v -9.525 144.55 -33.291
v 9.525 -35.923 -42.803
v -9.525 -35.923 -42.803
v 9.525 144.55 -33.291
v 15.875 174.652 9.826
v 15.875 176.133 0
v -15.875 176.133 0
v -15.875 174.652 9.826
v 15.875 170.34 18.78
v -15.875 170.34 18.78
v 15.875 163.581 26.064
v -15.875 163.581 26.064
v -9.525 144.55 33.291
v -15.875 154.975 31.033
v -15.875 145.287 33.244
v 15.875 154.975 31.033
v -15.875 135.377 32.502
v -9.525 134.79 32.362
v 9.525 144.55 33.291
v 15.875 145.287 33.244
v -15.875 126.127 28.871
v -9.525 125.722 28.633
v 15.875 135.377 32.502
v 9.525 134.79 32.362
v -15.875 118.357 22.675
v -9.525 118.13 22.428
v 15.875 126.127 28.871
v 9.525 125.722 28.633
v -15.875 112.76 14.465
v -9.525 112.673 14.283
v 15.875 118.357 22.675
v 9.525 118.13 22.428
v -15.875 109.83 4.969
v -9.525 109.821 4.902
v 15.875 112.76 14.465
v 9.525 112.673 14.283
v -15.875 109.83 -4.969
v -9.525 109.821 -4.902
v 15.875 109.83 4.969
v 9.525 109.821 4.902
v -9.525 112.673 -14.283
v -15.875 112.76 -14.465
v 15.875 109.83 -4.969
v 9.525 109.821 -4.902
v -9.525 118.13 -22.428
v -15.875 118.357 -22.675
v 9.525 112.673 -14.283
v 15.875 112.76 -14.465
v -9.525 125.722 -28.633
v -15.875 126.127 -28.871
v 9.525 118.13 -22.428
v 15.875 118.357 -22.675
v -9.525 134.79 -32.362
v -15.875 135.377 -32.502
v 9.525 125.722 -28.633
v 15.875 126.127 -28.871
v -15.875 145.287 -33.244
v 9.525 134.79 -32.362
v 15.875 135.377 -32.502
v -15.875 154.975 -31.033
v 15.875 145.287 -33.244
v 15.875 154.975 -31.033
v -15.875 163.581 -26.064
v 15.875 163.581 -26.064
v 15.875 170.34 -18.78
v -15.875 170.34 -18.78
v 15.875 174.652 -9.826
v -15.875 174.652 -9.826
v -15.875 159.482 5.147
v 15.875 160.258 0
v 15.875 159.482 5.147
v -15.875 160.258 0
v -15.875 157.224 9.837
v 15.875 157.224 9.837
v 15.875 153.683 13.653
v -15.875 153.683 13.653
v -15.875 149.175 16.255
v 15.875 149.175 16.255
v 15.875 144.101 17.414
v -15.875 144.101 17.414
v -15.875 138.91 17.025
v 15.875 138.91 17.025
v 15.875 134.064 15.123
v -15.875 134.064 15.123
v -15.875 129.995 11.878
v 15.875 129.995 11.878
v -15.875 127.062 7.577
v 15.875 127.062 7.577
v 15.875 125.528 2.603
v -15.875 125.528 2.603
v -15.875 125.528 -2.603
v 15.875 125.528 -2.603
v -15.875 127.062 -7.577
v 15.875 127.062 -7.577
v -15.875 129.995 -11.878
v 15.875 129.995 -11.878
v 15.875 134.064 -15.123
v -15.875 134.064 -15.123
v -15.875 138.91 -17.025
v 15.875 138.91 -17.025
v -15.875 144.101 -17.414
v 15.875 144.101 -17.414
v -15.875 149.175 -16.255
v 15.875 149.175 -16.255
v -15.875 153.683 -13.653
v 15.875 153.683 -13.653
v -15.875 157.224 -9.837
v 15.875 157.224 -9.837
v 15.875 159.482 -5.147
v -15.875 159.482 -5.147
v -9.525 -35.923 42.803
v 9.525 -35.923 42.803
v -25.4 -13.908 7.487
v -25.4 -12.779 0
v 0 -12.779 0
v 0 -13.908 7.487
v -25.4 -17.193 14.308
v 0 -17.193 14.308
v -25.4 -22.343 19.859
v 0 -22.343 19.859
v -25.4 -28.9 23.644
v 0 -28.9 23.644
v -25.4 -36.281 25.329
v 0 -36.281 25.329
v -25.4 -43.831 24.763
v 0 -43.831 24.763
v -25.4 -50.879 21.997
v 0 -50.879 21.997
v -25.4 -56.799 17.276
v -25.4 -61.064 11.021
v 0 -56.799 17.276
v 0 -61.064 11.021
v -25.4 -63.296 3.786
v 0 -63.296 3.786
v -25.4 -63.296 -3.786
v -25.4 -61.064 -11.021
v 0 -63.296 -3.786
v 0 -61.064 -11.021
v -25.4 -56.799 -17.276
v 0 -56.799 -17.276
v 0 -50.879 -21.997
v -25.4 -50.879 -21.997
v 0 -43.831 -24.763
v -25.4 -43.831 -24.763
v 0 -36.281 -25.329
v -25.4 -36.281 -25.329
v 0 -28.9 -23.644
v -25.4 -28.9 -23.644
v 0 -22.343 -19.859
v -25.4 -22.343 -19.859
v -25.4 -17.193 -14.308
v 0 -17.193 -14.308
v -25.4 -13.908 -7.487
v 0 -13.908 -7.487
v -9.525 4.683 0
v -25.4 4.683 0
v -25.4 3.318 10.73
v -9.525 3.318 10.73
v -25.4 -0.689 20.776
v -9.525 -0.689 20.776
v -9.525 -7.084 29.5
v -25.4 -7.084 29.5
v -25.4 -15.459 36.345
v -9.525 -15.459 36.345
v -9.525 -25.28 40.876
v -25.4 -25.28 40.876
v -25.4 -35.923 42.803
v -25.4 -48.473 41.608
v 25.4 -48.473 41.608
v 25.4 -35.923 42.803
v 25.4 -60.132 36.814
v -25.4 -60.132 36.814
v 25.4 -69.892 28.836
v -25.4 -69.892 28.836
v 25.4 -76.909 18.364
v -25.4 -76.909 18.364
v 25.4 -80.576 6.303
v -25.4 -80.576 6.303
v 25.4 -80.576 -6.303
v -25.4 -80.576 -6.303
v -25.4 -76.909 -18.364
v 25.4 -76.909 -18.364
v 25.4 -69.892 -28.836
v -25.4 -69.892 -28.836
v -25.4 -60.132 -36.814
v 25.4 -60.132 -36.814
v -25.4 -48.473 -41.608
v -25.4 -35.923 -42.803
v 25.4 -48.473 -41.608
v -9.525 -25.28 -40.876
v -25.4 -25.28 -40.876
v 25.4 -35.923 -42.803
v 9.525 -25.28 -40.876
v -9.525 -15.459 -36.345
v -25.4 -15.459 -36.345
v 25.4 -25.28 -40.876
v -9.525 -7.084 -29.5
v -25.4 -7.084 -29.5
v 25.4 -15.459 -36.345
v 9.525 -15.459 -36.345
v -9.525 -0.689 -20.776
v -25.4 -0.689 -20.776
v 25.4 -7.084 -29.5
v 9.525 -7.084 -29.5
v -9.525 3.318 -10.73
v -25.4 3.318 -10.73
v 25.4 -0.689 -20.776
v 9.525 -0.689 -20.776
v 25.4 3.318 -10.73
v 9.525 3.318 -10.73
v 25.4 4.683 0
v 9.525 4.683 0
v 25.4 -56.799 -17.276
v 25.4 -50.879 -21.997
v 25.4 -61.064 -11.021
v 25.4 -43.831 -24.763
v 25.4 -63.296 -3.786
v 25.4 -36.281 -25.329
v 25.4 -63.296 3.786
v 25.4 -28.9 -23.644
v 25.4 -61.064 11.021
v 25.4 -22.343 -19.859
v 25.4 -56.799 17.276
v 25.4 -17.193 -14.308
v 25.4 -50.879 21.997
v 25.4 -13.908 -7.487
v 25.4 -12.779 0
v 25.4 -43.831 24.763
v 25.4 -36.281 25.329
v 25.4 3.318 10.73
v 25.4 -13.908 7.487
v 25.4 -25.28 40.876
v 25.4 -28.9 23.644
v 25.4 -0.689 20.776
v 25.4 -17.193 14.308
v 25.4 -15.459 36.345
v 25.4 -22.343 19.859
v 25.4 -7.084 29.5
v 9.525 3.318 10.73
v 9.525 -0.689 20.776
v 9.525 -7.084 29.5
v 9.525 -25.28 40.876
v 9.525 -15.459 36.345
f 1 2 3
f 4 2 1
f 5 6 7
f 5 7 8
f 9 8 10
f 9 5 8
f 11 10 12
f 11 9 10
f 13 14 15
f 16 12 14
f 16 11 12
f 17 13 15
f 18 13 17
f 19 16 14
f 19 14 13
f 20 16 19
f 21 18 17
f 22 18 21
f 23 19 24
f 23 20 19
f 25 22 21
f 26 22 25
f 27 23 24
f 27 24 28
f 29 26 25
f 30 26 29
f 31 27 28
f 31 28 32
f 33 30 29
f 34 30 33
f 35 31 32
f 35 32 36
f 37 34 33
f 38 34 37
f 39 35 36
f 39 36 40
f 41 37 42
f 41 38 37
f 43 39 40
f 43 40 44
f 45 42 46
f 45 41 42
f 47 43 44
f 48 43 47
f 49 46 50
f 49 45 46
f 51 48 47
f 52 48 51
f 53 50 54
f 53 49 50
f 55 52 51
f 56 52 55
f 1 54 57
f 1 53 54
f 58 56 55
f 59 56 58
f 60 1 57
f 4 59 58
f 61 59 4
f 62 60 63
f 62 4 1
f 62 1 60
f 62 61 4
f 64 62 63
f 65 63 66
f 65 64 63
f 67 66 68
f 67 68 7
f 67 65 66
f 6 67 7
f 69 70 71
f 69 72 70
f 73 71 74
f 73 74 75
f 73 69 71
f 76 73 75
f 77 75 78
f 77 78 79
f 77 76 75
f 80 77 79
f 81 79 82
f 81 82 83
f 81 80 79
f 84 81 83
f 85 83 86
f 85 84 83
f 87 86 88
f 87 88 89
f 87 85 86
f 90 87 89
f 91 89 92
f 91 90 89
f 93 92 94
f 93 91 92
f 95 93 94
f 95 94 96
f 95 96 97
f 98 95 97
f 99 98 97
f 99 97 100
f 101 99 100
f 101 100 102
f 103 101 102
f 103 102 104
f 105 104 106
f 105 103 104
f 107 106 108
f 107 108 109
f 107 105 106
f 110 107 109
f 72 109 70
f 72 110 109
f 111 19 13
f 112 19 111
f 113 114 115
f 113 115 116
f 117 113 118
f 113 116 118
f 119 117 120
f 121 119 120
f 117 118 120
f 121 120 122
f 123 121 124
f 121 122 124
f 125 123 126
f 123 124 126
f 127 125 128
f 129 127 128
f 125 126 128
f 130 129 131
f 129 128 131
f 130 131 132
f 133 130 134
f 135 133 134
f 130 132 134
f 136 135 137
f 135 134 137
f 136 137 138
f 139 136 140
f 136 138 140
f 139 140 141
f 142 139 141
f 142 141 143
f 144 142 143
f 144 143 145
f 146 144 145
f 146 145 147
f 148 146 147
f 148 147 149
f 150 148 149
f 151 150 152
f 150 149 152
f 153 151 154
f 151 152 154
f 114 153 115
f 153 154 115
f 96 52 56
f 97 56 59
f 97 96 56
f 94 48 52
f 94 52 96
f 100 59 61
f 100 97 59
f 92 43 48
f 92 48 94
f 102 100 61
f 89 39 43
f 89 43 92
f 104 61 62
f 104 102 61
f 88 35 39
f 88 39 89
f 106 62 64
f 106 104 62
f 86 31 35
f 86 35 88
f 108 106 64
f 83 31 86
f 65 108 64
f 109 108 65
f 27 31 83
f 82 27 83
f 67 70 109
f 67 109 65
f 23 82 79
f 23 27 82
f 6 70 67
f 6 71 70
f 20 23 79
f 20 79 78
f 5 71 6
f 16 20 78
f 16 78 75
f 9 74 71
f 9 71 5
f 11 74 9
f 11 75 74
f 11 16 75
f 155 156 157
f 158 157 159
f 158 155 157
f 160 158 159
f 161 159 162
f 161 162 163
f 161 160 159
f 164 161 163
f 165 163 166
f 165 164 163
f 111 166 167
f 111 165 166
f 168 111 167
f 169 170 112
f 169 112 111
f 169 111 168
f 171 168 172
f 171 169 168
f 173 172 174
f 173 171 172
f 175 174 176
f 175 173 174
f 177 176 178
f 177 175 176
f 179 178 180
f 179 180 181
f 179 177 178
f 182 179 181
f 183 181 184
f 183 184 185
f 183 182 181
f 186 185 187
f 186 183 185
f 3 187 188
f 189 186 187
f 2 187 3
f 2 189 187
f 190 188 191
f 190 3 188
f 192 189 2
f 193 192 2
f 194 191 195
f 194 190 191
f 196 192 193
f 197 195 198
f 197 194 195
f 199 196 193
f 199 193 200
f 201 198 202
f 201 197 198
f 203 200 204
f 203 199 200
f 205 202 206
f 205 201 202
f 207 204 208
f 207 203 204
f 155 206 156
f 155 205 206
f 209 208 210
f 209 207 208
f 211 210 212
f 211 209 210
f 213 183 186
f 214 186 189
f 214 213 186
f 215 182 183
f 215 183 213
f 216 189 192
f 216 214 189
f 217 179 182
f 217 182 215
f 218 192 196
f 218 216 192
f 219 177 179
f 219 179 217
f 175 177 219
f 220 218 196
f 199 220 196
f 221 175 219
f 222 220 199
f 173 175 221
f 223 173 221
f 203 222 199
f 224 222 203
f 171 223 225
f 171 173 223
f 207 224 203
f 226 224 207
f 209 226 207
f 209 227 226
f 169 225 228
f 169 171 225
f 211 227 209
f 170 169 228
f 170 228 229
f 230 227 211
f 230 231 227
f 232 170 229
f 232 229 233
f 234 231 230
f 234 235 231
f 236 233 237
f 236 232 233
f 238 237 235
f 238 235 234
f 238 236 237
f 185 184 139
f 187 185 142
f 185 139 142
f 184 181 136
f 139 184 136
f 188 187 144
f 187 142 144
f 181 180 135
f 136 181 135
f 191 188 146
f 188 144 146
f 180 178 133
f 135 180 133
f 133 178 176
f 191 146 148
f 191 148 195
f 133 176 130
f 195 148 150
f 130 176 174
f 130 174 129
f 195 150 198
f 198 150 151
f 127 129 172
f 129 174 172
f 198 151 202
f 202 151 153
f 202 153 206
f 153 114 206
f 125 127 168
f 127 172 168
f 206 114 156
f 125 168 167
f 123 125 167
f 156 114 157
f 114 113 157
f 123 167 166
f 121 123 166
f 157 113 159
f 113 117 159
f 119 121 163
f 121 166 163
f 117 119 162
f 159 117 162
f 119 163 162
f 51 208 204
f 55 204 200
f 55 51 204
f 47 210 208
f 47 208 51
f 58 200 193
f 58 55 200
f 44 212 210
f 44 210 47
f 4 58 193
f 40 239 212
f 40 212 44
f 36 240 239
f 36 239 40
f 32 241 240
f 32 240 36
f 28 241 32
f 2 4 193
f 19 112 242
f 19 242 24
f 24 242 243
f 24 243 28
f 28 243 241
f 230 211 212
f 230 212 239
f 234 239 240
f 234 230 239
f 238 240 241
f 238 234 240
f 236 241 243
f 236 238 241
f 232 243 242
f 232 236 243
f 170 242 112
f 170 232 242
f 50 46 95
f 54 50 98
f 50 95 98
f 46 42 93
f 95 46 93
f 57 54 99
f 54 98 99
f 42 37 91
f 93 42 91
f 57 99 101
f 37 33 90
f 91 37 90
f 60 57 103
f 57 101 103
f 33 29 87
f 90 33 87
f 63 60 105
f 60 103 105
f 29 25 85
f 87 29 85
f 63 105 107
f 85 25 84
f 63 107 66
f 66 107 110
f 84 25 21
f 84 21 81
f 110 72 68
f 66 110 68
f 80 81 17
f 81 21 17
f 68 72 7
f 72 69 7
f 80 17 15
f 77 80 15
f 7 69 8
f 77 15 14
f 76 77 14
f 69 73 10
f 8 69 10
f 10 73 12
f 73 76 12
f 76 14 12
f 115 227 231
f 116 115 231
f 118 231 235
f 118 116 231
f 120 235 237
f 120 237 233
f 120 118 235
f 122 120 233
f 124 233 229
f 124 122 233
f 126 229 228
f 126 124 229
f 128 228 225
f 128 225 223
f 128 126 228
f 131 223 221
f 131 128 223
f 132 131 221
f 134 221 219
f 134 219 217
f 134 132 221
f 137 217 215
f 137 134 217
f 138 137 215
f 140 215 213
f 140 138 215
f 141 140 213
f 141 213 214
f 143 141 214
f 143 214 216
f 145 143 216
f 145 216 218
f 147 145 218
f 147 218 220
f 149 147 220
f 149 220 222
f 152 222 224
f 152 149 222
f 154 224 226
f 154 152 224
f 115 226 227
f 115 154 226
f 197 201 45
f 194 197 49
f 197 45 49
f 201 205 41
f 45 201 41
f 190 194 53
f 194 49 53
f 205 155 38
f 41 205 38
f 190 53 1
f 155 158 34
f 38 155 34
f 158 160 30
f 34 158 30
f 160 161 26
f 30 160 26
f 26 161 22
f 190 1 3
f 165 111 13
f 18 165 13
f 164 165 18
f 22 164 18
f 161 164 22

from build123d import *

# Parameters (mm, degrees)
F1_DEPTH = 9.525
F0_R     = 25.4
F2_DEPTH = 25.4
F0_R_2   = 17.4625
F3_DEPTH = 15.875


with BuildPart() as f1:
    # F0 (on Right) → F1 (new body, symmetric)
    with BuildSketch(Plane.YZ):
        with BuildLine():
            ThreePointArc((-35.9234930565, 42.803092487), (-7.0836883387, 29.4999956791), (4.6830858909, 0))
            ThreePointArc((4.6830858909, 0), (-7.0836883387, -29.4999956791), (-35.9234930565, -42.803092487))
            Line((-35.9234930565, -42.803092487), (144.5501911541, -33.2912941566))
            ThreePointArc((144.5501911541, -33.2912941566), (109.4580858909, 0), (144.5501911541, 33.2912941566))
            Line((144.5501911541, 33.2912941566), (-35.9234930565, 42.803092487))
        make_face()
    extrude(amount=F1_DEPTH, both=True)

    # F0 (on Right) → F2 (join, symmetric)
    with BuildSketch(Plane.YZ):
        with BuildLine():
            ThreePointArc((-35.9234930565, -42.803092487), (-7.0836883387, -29.4999956791), (4.6830858909, 0))
            ThreePointArc((4.6830858909, 0), (-7.0836883387, 29.4999956791), (-35.9234930565, 42.803092487))
            ThreePointArc((-35.9234930565, 42.803092487), (-81.0419141091, 0), (-35.9234930565, -42.803092487))
        make_face()
        with Locations((-38.1794141091, 0)):
            Circle(F0_R, mode=Mode.SUBTRACT)
    extrude(amount=F2_DEPTH, both=True)

    # F0 (on Right) → F3 (join, symmetric)
    with BuildSketch(Plane.YZ):
        with BuildLine():
            ThreePointArc((176.1330858909, 0), (166.981150379, 22.9444410837), (144.5501911541, 33.2912941566))
            ThreePointArc((144.5501911541, 33.2912941566), (109.4580858909, 0), (144.5501911541, -33.2912941566))
            ThreePointArc((144.5501911541, -33.2912941566), (166.981150379, -22.9444410837), (176.1330858909, 0))
        make_face()
        with Locations((142.7955858909, 0)):
            Circle(F0_R_2, mode=Mode.SUBTRACT)
    extrude(amount=F3_DEPTH, both=True)


solid = f1.part
